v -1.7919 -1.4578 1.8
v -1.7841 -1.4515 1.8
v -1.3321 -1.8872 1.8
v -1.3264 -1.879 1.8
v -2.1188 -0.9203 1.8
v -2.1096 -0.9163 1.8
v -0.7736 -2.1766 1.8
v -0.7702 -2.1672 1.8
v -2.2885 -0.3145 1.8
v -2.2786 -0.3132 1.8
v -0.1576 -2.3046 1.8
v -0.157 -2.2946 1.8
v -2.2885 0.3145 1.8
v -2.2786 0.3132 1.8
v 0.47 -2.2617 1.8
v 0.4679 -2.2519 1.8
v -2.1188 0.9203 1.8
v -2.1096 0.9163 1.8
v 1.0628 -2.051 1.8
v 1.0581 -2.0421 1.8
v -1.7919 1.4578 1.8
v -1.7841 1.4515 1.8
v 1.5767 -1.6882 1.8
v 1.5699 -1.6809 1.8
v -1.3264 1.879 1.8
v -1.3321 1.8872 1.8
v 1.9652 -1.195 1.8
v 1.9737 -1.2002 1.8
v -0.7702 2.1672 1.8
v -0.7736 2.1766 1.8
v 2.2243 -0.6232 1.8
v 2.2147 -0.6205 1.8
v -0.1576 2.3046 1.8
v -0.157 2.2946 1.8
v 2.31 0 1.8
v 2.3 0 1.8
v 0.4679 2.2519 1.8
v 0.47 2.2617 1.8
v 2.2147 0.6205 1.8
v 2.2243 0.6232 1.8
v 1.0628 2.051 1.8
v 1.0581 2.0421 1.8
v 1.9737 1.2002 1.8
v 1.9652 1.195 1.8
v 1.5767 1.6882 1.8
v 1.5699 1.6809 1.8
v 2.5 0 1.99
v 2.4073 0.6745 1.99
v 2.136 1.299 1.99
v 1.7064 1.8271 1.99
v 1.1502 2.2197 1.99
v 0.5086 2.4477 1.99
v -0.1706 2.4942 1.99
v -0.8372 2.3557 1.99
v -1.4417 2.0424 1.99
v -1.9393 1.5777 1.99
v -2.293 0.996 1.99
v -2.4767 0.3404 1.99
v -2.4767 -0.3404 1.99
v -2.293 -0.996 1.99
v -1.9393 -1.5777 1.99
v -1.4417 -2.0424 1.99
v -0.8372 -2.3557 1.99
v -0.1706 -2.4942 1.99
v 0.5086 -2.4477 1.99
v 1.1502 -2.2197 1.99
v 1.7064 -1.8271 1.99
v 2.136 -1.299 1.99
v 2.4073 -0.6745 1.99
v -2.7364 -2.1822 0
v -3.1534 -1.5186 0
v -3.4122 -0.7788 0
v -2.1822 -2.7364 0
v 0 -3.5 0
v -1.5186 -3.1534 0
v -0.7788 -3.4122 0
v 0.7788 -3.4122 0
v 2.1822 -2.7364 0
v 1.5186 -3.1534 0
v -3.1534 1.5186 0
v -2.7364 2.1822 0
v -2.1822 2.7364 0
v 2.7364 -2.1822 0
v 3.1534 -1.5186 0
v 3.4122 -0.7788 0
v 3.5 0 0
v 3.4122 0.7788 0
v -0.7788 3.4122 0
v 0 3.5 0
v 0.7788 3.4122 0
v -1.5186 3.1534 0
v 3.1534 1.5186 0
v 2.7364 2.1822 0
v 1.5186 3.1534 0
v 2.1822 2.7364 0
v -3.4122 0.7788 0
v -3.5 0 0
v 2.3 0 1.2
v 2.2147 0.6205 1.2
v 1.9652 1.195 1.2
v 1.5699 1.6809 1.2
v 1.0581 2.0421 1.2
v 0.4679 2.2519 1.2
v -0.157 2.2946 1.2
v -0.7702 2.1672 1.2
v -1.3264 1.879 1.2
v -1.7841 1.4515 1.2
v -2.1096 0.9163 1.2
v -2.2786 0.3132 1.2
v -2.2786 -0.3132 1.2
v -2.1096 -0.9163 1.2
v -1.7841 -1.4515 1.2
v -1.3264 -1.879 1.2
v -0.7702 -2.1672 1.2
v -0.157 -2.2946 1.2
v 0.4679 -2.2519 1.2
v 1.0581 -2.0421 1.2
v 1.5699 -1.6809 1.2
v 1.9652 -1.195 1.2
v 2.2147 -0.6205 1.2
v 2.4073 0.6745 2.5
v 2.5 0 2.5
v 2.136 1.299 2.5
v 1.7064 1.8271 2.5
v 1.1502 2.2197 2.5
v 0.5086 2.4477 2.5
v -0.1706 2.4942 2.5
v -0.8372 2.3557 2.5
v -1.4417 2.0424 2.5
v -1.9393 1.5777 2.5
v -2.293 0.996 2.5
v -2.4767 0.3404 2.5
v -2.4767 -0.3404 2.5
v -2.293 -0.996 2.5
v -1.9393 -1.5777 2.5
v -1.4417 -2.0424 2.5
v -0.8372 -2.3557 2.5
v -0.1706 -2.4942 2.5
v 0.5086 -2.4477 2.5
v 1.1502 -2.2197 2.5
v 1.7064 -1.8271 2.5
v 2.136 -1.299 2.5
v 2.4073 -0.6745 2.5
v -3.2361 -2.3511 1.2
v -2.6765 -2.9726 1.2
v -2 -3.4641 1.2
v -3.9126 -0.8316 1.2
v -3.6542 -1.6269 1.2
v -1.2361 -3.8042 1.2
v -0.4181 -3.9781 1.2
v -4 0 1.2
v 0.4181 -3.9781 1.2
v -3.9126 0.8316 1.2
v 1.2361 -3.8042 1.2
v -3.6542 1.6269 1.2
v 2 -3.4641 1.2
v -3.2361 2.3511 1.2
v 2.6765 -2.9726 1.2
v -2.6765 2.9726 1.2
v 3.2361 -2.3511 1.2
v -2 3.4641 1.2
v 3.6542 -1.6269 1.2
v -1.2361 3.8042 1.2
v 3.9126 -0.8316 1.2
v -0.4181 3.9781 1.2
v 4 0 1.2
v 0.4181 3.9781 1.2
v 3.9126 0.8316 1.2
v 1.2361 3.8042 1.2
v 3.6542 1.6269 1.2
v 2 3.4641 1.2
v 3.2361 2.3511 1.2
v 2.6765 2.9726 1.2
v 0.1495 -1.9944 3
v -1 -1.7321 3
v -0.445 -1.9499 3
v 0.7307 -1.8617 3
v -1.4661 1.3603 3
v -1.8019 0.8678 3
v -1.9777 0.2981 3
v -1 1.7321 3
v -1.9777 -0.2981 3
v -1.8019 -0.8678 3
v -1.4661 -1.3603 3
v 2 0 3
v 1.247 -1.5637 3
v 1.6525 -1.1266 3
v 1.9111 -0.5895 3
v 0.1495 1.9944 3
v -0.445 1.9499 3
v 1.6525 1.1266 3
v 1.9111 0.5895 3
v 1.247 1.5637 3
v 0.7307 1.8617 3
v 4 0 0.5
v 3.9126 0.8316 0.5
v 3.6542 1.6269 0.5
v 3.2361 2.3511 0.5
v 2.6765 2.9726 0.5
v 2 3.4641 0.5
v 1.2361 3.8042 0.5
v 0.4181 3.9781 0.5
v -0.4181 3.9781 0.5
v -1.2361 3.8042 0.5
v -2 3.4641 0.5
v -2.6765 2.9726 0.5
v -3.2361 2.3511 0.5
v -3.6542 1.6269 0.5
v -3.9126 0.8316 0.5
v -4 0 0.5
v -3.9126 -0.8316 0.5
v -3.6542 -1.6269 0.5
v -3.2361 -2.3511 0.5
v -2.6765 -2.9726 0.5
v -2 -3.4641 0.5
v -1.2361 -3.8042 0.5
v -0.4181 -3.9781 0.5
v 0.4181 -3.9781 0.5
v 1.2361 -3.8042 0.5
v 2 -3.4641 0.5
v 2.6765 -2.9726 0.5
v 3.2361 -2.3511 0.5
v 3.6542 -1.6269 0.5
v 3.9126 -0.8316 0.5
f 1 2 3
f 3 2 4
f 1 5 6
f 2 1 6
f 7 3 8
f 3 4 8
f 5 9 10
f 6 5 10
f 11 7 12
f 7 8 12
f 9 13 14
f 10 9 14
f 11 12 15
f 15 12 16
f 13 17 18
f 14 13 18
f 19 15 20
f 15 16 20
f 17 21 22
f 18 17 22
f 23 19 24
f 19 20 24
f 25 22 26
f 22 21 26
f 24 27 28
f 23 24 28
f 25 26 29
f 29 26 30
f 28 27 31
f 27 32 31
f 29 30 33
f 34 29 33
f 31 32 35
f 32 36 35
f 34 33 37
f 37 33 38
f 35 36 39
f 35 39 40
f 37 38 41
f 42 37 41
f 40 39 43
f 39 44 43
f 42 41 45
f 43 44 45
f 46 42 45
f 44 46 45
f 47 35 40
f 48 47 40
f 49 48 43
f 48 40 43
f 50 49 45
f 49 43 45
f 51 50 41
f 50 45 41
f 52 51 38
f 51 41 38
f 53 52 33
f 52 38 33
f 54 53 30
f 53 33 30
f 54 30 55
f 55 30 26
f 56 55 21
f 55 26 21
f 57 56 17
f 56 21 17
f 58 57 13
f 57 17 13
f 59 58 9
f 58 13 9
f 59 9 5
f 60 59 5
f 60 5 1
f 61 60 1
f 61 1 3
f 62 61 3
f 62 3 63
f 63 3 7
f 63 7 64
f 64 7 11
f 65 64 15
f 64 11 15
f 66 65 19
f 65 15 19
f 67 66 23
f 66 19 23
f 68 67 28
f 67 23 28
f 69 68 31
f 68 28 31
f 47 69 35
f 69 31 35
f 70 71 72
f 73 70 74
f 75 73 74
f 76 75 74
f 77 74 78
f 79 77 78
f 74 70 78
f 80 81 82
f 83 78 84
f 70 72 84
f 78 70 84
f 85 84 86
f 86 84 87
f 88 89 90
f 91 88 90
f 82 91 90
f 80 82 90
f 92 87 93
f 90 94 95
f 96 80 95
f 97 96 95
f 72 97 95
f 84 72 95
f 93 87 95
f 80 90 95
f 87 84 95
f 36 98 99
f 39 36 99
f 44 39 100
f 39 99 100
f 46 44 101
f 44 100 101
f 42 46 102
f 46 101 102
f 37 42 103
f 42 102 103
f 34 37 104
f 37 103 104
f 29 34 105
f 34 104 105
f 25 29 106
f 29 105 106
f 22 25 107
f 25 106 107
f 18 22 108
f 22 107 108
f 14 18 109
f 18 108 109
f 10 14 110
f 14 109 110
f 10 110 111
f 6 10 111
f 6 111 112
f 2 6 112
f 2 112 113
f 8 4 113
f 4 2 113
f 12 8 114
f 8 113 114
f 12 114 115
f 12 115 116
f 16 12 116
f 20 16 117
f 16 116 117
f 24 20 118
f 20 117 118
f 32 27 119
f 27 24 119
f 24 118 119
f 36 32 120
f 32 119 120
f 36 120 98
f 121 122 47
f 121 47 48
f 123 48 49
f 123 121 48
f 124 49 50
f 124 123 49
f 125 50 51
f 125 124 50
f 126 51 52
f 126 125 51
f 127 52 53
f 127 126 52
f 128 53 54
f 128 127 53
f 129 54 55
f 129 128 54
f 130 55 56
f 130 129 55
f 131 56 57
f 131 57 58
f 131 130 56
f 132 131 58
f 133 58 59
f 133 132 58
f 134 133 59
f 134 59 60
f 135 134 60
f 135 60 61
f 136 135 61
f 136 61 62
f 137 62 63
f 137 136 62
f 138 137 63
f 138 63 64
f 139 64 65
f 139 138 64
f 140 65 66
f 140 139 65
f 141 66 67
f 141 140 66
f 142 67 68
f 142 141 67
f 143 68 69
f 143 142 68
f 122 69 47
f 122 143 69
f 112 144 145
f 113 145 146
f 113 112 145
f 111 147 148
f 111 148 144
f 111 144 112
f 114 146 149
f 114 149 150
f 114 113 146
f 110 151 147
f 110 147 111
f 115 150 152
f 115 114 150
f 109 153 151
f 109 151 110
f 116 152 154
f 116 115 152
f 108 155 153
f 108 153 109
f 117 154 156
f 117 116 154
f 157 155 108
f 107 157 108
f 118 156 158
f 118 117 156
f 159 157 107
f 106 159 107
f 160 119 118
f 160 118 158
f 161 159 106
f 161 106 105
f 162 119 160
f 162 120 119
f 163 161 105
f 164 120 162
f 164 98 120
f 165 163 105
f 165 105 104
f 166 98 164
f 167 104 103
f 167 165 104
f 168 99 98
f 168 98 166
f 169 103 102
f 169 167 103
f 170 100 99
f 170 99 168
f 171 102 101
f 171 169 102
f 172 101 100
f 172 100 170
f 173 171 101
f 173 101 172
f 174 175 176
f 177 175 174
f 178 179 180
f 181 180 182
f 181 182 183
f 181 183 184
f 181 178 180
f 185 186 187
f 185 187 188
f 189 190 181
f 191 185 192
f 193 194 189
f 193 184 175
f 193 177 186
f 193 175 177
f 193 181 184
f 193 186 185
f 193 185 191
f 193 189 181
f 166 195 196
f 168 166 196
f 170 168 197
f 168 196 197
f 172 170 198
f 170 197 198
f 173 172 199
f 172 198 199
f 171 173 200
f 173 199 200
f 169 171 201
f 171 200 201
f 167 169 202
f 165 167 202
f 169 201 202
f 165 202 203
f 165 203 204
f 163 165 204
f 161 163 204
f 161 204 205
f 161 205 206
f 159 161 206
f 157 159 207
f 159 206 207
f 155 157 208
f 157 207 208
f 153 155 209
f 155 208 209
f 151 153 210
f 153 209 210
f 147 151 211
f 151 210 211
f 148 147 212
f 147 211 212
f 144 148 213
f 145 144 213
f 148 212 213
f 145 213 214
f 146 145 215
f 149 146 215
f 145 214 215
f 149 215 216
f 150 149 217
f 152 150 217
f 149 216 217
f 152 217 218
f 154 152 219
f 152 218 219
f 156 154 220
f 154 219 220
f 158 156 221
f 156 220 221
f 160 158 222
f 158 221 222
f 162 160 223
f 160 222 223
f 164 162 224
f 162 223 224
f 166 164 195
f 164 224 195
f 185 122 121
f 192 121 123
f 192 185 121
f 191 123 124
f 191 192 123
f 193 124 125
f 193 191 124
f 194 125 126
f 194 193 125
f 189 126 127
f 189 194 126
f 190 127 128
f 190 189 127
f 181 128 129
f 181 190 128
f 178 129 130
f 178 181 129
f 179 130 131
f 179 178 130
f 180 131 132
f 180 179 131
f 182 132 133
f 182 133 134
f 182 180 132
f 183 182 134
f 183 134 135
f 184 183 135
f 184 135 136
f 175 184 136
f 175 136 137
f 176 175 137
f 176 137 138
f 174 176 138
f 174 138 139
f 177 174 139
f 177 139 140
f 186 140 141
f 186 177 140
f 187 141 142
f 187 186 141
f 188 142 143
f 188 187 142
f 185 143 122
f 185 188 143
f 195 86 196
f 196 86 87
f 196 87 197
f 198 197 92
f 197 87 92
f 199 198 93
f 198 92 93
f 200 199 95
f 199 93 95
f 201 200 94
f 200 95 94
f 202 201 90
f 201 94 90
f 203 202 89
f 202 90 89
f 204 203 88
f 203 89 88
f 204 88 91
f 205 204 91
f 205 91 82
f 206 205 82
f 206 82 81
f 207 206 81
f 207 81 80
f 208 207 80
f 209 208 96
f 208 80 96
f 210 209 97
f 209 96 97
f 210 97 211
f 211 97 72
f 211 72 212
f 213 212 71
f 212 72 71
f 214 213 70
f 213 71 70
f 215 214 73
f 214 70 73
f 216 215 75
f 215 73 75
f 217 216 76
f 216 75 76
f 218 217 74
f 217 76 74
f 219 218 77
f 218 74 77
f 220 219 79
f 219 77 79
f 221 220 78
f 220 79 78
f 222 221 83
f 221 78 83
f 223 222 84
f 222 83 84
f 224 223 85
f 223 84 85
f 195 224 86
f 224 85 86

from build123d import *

# Parameters (mm, degrees)
SKETCH_R        = 4
PAD_DEPTH       = 1.2
SKETCH001_R     = 2.3
PAD001_DEPTH    = 1.8
SKETCH002_R     = 2.5
PAD002_DEPTH    = 1.2
CHAMFER_SIZE    = 0.5
CHAMFER001_SIZE = 0.19


with BuildPart() as part:
    # Sketch → Pad (new body)
    with BuildSketch(Plane.XY):
        Circle(SKETCH_R)
    extrude(amount=PAD_DEPTH)

    # Sketch001 → Pad001 (join)
    with BuildSketch(Plane.XY.offset(1.2)):
        Circle(SKETCH001_R)
    extrude(amount=PAD001_DEPTH)

    # Sketch002 → Pad002 (join)
    with BuildSketch(Plane.XY.offset(3)):
        Circle(SKETCH002_R)
    extrude(amount=-PAD002_DEPTH)

    # Chamfer
    chamfer_edges = [part.edges().sort_by_distance(p)[0] for p in [
        (-2.5, 0, 3),
        (-4, 0, 0),
    ]]
    chamfer(chamfer_edges, length=CHAMFER_SIZE)

    # Chamfer001
    chamfer001_edges = [part.edges().sort_by_distance(p)[0] for p in [
        (-2.5, 0, 1.8),
    ]]
    chamfer(chamfer001_edges, length=CHAMFER001_SIZE)


solid = part.part
